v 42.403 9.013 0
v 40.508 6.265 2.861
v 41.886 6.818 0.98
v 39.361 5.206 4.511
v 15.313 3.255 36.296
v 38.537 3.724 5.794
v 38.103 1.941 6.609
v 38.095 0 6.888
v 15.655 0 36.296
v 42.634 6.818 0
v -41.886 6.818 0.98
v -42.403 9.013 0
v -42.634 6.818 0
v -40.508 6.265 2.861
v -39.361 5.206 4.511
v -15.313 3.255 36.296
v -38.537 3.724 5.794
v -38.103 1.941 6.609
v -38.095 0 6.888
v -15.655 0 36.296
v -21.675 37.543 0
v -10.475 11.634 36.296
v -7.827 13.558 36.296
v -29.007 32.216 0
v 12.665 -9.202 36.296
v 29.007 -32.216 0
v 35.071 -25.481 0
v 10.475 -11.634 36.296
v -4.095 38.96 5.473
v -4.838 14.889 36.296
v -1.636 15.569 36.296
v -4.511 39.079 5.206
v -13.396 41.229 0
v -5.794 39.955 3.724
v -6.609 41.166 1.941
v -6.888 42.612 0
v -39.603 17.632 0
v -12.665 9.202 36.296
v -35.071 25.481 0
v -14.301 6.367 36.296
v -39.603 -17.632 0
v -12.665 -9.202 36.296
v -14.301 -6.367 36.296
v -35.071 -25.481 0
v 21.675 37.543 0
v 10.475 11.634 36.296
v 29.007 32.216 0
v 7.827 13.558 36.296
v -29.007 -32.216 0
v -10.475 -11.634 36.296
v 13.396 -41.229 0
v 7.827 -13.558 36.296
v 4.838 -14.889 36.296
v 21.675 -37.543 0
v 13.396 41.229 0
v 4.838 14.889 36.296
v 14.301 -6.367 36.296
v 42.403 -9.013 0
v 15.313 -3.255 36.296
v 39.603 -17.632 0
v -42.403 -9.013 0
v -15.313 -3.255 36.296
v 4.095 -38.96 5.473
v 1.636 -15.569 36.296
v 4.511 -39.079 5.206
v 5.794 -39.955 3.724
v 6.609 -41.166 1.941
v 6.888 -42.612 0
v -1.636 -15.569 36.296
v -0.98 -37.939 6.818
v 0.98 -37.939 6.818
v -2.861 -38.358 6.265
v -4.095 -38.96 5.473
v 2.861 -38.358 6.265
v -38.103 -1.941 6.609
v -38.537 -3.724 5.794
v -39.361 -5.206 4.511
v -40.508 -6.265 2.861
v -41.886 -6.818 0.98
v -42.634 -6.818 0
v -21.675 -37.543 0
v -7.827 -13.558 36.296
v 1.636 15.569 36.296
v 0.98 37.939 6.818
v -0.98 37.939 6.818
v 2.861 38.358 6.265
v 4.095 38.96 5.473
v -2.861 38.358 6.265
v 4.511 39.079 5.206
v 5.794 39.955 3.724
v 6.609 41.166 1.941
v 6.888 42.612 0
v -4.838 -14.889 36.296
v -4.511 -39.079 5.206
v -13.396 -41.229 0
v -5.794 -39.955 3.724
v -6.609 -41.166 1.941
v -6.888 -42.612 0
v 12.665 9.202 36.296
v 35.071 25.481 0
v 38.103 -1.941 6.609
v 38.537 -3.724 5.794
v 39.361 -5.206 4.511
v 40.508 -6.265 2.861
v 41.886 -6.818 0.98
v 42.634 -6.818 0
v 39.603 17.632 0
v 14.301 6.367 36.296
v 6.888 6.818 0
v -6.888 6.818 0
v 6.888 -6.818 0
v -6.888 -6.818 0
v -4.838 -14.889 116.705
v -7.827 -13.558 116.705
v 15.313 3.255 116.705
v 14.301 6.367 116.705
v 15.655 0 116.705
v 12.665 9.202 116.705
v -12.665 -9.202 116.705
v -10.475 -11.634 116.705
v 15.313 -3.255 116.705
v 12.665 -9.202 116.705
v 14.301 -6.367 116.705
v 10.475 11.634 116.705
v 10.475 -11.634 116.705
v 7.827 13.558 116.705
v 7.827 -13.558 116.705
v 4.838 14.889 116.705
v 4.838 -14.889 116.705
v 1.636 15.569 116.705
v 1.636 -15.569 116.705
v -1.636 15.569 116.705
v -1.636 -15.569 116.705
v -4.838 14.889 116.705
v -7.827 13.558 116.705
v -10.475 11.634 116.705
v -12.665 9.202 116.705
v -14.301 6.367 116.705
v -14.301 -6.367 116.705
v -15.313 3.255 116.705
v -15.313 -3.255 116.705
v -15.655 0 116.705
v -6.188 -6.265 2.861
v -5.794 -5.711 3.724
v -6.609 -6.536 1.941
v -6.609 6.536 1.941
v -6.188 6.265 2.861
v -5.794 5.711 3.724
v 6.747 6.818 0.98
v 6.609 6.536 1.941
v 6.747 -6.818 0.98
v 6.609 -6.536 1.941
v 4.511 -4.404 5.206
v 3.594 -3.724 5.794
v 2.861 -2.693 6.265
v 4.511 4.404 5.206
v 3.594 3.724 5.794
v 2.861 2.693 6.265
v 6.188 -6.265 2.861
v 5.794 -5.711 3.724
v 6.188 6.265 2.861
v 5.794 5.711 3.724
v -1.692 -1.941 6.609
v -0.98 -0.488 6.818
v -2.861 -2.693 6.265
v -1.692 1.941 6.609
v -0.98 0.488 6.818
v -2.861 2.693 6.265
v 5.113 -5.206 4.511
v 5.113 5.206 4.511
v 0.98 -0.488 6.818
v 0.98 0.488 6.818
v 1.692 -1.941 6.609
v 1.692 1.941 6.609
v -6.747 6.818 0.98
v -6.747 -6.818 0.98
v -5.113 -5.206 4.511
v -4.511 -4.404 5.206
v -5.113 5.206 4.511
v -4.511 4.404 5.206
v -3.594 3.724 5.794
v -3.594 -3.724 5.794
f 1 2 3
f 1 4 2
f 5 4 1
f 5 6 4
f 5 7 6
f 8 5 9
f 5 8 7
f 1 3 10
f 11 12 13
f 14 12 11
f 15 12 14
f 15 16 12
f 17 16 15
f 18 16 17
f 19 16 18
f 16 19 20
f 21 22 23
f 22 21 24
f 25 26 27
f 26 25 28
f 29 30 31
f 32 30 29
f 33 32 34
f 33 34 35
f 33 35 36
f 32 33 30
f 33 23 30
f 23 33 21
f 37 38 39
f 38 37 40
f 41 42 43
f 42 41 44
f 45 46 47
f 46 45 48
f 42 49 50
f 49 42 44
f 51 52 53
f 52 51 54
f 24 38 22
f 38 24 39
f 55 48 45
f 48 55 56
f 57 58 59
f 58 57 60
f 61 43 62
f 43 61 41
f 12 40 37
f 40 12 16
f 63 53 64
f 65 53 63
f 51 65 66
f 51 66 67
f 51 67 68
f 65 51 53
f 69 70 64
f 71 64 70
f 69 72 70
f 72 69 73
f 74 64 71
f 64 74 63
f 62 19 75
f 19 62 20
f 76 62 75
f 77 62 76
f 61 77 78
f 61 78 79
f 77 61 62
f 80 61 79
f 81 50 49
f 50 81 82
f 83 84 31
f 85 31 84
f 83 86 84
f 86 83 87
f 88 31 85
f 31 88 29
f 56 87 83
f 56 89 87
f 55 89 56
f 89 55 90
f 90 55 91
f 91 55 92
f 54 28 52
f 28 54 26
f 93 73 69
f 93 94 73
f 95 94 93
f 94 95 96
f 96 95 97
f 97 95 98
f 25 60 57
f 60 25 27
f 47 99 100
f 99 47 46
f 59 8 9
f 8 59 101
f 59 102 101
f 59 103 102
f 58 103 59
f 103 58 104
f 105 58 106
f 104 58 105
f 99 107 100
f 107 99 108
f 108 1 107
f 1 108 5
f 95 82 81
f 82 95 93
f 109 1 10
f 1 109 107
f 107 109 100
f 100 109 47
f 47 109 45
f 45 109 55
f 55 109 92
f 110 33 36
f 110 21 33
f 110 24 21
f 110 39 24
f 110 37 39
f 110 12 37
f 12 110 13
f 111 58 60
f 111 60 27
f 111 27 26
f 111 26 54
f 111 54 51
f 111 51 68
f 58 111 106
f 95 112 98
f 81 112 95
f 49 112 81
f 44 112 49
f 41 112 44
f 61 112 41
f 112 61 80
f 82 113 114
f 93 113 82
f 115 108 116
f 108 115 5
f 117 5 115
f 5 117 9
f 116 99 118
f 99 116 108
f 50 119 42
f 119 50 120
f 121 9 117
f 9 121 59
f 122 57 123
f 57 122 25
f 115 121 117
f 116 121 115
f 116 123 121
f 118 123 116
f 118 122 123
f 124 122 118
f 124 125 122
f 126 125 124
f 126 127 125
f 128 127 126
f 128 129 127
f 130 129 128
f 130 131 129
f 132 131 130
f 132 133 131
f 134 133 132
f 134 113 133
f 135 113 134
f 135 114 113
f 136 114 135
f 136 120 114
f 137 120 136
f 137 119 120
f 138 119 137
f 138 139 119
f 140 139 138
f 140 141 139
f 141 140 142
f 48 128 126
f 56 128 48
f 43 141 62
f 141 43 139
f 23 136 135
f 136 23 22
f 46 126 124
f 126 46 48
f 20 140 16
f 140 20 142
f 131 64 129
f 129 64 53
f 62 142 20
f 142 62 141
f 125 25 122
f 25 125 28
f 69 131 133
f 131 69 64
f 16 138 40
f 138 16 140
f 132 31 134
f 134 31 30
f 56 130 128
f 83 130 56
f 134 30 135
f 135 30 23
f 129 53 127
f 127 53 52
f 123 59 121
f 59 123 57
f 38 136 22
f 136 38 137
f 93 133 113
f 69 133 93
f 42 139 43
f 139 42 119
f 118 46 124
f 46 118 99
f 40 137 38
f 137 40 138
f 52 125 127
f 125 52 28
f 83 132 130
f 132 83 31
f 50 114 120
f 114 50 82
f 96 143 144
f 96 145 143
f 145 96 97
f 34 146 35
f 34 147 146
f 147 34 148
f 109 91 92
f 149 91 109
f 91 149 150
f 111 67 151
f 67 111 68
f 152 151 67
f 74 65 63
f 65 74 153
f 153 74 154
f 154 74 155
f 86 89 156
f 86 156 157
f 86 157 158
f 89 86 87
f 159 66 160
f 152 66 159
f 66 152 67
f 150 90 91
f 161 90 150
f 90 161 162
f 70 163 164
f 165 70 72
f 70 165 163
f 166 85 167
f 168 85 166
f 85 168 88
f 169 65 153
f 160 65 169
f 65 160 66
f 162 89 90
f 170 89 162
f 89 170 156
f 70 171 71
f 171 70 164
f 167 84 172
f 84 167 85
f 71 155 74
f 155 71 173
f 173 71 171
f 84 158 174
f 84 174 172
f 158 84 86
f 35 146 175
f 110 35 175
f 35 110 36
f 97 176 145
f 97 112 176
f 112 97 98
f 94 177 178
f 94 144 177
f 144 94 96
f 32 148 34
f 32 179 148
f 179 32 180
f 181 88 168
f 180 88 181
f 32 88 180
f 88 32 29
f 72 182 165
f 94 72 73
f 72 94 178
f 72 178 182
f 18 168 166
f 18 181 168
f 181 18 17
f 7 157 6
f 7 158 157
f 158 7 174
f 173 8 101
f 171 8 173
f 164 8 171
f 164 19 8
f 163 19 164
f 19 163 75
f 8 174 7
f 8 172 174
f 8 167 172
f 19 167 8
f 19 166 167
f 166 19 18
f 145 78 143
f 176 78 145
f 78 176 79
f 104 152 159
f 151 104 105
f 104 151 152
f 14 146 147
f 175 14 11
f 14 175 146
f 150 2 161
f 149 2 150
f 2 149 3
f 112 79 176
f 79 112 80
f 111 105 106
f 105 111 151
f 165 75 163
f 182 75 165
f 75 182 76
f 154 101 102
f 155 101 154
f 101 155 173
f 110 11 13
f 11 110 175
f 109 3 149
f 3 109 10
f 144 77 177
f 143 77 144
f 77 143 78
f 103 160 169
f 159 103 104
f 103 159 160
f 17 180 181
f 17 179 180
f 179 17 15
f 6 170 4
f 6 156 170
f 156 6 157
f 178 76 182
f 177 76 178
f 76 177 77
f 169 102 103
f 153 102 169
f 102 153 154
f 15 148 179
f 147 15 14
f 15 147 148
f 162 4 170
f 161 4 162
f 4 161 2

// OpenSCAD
seed = 4;
seeds = rands(0,1000000,10,seed);
head_outer_radius = rands(25,50,1,seeds[0])[0];
head_inner_radius = rands(10,head_outer_radius*2/3,1,seeds[1])[0];
head_length = rands(40,80,1,seeds[2])[0];
bolt_length = rands(head_length*2,200,1,seeds[3])[0];
cylinder_size = rands(5, head_outer_radius/4,1, seeds[4])[0];

difference(){
    union(){
        cylinder(head_length,head_outer_radius,0);
        cylinder(bolt_length,head_inner_radius,head_inner_radius);
    }
    rotate([90, 0, 0]){
        cylinder(head_outer_radius*2, cylinder_size, cylinder_size, center=true);
    }
    rotate([0, 90, 0]){
        cylinder(head_outer_radius*2, cylinder_size, cylinder_size, center=true);
    }
}
